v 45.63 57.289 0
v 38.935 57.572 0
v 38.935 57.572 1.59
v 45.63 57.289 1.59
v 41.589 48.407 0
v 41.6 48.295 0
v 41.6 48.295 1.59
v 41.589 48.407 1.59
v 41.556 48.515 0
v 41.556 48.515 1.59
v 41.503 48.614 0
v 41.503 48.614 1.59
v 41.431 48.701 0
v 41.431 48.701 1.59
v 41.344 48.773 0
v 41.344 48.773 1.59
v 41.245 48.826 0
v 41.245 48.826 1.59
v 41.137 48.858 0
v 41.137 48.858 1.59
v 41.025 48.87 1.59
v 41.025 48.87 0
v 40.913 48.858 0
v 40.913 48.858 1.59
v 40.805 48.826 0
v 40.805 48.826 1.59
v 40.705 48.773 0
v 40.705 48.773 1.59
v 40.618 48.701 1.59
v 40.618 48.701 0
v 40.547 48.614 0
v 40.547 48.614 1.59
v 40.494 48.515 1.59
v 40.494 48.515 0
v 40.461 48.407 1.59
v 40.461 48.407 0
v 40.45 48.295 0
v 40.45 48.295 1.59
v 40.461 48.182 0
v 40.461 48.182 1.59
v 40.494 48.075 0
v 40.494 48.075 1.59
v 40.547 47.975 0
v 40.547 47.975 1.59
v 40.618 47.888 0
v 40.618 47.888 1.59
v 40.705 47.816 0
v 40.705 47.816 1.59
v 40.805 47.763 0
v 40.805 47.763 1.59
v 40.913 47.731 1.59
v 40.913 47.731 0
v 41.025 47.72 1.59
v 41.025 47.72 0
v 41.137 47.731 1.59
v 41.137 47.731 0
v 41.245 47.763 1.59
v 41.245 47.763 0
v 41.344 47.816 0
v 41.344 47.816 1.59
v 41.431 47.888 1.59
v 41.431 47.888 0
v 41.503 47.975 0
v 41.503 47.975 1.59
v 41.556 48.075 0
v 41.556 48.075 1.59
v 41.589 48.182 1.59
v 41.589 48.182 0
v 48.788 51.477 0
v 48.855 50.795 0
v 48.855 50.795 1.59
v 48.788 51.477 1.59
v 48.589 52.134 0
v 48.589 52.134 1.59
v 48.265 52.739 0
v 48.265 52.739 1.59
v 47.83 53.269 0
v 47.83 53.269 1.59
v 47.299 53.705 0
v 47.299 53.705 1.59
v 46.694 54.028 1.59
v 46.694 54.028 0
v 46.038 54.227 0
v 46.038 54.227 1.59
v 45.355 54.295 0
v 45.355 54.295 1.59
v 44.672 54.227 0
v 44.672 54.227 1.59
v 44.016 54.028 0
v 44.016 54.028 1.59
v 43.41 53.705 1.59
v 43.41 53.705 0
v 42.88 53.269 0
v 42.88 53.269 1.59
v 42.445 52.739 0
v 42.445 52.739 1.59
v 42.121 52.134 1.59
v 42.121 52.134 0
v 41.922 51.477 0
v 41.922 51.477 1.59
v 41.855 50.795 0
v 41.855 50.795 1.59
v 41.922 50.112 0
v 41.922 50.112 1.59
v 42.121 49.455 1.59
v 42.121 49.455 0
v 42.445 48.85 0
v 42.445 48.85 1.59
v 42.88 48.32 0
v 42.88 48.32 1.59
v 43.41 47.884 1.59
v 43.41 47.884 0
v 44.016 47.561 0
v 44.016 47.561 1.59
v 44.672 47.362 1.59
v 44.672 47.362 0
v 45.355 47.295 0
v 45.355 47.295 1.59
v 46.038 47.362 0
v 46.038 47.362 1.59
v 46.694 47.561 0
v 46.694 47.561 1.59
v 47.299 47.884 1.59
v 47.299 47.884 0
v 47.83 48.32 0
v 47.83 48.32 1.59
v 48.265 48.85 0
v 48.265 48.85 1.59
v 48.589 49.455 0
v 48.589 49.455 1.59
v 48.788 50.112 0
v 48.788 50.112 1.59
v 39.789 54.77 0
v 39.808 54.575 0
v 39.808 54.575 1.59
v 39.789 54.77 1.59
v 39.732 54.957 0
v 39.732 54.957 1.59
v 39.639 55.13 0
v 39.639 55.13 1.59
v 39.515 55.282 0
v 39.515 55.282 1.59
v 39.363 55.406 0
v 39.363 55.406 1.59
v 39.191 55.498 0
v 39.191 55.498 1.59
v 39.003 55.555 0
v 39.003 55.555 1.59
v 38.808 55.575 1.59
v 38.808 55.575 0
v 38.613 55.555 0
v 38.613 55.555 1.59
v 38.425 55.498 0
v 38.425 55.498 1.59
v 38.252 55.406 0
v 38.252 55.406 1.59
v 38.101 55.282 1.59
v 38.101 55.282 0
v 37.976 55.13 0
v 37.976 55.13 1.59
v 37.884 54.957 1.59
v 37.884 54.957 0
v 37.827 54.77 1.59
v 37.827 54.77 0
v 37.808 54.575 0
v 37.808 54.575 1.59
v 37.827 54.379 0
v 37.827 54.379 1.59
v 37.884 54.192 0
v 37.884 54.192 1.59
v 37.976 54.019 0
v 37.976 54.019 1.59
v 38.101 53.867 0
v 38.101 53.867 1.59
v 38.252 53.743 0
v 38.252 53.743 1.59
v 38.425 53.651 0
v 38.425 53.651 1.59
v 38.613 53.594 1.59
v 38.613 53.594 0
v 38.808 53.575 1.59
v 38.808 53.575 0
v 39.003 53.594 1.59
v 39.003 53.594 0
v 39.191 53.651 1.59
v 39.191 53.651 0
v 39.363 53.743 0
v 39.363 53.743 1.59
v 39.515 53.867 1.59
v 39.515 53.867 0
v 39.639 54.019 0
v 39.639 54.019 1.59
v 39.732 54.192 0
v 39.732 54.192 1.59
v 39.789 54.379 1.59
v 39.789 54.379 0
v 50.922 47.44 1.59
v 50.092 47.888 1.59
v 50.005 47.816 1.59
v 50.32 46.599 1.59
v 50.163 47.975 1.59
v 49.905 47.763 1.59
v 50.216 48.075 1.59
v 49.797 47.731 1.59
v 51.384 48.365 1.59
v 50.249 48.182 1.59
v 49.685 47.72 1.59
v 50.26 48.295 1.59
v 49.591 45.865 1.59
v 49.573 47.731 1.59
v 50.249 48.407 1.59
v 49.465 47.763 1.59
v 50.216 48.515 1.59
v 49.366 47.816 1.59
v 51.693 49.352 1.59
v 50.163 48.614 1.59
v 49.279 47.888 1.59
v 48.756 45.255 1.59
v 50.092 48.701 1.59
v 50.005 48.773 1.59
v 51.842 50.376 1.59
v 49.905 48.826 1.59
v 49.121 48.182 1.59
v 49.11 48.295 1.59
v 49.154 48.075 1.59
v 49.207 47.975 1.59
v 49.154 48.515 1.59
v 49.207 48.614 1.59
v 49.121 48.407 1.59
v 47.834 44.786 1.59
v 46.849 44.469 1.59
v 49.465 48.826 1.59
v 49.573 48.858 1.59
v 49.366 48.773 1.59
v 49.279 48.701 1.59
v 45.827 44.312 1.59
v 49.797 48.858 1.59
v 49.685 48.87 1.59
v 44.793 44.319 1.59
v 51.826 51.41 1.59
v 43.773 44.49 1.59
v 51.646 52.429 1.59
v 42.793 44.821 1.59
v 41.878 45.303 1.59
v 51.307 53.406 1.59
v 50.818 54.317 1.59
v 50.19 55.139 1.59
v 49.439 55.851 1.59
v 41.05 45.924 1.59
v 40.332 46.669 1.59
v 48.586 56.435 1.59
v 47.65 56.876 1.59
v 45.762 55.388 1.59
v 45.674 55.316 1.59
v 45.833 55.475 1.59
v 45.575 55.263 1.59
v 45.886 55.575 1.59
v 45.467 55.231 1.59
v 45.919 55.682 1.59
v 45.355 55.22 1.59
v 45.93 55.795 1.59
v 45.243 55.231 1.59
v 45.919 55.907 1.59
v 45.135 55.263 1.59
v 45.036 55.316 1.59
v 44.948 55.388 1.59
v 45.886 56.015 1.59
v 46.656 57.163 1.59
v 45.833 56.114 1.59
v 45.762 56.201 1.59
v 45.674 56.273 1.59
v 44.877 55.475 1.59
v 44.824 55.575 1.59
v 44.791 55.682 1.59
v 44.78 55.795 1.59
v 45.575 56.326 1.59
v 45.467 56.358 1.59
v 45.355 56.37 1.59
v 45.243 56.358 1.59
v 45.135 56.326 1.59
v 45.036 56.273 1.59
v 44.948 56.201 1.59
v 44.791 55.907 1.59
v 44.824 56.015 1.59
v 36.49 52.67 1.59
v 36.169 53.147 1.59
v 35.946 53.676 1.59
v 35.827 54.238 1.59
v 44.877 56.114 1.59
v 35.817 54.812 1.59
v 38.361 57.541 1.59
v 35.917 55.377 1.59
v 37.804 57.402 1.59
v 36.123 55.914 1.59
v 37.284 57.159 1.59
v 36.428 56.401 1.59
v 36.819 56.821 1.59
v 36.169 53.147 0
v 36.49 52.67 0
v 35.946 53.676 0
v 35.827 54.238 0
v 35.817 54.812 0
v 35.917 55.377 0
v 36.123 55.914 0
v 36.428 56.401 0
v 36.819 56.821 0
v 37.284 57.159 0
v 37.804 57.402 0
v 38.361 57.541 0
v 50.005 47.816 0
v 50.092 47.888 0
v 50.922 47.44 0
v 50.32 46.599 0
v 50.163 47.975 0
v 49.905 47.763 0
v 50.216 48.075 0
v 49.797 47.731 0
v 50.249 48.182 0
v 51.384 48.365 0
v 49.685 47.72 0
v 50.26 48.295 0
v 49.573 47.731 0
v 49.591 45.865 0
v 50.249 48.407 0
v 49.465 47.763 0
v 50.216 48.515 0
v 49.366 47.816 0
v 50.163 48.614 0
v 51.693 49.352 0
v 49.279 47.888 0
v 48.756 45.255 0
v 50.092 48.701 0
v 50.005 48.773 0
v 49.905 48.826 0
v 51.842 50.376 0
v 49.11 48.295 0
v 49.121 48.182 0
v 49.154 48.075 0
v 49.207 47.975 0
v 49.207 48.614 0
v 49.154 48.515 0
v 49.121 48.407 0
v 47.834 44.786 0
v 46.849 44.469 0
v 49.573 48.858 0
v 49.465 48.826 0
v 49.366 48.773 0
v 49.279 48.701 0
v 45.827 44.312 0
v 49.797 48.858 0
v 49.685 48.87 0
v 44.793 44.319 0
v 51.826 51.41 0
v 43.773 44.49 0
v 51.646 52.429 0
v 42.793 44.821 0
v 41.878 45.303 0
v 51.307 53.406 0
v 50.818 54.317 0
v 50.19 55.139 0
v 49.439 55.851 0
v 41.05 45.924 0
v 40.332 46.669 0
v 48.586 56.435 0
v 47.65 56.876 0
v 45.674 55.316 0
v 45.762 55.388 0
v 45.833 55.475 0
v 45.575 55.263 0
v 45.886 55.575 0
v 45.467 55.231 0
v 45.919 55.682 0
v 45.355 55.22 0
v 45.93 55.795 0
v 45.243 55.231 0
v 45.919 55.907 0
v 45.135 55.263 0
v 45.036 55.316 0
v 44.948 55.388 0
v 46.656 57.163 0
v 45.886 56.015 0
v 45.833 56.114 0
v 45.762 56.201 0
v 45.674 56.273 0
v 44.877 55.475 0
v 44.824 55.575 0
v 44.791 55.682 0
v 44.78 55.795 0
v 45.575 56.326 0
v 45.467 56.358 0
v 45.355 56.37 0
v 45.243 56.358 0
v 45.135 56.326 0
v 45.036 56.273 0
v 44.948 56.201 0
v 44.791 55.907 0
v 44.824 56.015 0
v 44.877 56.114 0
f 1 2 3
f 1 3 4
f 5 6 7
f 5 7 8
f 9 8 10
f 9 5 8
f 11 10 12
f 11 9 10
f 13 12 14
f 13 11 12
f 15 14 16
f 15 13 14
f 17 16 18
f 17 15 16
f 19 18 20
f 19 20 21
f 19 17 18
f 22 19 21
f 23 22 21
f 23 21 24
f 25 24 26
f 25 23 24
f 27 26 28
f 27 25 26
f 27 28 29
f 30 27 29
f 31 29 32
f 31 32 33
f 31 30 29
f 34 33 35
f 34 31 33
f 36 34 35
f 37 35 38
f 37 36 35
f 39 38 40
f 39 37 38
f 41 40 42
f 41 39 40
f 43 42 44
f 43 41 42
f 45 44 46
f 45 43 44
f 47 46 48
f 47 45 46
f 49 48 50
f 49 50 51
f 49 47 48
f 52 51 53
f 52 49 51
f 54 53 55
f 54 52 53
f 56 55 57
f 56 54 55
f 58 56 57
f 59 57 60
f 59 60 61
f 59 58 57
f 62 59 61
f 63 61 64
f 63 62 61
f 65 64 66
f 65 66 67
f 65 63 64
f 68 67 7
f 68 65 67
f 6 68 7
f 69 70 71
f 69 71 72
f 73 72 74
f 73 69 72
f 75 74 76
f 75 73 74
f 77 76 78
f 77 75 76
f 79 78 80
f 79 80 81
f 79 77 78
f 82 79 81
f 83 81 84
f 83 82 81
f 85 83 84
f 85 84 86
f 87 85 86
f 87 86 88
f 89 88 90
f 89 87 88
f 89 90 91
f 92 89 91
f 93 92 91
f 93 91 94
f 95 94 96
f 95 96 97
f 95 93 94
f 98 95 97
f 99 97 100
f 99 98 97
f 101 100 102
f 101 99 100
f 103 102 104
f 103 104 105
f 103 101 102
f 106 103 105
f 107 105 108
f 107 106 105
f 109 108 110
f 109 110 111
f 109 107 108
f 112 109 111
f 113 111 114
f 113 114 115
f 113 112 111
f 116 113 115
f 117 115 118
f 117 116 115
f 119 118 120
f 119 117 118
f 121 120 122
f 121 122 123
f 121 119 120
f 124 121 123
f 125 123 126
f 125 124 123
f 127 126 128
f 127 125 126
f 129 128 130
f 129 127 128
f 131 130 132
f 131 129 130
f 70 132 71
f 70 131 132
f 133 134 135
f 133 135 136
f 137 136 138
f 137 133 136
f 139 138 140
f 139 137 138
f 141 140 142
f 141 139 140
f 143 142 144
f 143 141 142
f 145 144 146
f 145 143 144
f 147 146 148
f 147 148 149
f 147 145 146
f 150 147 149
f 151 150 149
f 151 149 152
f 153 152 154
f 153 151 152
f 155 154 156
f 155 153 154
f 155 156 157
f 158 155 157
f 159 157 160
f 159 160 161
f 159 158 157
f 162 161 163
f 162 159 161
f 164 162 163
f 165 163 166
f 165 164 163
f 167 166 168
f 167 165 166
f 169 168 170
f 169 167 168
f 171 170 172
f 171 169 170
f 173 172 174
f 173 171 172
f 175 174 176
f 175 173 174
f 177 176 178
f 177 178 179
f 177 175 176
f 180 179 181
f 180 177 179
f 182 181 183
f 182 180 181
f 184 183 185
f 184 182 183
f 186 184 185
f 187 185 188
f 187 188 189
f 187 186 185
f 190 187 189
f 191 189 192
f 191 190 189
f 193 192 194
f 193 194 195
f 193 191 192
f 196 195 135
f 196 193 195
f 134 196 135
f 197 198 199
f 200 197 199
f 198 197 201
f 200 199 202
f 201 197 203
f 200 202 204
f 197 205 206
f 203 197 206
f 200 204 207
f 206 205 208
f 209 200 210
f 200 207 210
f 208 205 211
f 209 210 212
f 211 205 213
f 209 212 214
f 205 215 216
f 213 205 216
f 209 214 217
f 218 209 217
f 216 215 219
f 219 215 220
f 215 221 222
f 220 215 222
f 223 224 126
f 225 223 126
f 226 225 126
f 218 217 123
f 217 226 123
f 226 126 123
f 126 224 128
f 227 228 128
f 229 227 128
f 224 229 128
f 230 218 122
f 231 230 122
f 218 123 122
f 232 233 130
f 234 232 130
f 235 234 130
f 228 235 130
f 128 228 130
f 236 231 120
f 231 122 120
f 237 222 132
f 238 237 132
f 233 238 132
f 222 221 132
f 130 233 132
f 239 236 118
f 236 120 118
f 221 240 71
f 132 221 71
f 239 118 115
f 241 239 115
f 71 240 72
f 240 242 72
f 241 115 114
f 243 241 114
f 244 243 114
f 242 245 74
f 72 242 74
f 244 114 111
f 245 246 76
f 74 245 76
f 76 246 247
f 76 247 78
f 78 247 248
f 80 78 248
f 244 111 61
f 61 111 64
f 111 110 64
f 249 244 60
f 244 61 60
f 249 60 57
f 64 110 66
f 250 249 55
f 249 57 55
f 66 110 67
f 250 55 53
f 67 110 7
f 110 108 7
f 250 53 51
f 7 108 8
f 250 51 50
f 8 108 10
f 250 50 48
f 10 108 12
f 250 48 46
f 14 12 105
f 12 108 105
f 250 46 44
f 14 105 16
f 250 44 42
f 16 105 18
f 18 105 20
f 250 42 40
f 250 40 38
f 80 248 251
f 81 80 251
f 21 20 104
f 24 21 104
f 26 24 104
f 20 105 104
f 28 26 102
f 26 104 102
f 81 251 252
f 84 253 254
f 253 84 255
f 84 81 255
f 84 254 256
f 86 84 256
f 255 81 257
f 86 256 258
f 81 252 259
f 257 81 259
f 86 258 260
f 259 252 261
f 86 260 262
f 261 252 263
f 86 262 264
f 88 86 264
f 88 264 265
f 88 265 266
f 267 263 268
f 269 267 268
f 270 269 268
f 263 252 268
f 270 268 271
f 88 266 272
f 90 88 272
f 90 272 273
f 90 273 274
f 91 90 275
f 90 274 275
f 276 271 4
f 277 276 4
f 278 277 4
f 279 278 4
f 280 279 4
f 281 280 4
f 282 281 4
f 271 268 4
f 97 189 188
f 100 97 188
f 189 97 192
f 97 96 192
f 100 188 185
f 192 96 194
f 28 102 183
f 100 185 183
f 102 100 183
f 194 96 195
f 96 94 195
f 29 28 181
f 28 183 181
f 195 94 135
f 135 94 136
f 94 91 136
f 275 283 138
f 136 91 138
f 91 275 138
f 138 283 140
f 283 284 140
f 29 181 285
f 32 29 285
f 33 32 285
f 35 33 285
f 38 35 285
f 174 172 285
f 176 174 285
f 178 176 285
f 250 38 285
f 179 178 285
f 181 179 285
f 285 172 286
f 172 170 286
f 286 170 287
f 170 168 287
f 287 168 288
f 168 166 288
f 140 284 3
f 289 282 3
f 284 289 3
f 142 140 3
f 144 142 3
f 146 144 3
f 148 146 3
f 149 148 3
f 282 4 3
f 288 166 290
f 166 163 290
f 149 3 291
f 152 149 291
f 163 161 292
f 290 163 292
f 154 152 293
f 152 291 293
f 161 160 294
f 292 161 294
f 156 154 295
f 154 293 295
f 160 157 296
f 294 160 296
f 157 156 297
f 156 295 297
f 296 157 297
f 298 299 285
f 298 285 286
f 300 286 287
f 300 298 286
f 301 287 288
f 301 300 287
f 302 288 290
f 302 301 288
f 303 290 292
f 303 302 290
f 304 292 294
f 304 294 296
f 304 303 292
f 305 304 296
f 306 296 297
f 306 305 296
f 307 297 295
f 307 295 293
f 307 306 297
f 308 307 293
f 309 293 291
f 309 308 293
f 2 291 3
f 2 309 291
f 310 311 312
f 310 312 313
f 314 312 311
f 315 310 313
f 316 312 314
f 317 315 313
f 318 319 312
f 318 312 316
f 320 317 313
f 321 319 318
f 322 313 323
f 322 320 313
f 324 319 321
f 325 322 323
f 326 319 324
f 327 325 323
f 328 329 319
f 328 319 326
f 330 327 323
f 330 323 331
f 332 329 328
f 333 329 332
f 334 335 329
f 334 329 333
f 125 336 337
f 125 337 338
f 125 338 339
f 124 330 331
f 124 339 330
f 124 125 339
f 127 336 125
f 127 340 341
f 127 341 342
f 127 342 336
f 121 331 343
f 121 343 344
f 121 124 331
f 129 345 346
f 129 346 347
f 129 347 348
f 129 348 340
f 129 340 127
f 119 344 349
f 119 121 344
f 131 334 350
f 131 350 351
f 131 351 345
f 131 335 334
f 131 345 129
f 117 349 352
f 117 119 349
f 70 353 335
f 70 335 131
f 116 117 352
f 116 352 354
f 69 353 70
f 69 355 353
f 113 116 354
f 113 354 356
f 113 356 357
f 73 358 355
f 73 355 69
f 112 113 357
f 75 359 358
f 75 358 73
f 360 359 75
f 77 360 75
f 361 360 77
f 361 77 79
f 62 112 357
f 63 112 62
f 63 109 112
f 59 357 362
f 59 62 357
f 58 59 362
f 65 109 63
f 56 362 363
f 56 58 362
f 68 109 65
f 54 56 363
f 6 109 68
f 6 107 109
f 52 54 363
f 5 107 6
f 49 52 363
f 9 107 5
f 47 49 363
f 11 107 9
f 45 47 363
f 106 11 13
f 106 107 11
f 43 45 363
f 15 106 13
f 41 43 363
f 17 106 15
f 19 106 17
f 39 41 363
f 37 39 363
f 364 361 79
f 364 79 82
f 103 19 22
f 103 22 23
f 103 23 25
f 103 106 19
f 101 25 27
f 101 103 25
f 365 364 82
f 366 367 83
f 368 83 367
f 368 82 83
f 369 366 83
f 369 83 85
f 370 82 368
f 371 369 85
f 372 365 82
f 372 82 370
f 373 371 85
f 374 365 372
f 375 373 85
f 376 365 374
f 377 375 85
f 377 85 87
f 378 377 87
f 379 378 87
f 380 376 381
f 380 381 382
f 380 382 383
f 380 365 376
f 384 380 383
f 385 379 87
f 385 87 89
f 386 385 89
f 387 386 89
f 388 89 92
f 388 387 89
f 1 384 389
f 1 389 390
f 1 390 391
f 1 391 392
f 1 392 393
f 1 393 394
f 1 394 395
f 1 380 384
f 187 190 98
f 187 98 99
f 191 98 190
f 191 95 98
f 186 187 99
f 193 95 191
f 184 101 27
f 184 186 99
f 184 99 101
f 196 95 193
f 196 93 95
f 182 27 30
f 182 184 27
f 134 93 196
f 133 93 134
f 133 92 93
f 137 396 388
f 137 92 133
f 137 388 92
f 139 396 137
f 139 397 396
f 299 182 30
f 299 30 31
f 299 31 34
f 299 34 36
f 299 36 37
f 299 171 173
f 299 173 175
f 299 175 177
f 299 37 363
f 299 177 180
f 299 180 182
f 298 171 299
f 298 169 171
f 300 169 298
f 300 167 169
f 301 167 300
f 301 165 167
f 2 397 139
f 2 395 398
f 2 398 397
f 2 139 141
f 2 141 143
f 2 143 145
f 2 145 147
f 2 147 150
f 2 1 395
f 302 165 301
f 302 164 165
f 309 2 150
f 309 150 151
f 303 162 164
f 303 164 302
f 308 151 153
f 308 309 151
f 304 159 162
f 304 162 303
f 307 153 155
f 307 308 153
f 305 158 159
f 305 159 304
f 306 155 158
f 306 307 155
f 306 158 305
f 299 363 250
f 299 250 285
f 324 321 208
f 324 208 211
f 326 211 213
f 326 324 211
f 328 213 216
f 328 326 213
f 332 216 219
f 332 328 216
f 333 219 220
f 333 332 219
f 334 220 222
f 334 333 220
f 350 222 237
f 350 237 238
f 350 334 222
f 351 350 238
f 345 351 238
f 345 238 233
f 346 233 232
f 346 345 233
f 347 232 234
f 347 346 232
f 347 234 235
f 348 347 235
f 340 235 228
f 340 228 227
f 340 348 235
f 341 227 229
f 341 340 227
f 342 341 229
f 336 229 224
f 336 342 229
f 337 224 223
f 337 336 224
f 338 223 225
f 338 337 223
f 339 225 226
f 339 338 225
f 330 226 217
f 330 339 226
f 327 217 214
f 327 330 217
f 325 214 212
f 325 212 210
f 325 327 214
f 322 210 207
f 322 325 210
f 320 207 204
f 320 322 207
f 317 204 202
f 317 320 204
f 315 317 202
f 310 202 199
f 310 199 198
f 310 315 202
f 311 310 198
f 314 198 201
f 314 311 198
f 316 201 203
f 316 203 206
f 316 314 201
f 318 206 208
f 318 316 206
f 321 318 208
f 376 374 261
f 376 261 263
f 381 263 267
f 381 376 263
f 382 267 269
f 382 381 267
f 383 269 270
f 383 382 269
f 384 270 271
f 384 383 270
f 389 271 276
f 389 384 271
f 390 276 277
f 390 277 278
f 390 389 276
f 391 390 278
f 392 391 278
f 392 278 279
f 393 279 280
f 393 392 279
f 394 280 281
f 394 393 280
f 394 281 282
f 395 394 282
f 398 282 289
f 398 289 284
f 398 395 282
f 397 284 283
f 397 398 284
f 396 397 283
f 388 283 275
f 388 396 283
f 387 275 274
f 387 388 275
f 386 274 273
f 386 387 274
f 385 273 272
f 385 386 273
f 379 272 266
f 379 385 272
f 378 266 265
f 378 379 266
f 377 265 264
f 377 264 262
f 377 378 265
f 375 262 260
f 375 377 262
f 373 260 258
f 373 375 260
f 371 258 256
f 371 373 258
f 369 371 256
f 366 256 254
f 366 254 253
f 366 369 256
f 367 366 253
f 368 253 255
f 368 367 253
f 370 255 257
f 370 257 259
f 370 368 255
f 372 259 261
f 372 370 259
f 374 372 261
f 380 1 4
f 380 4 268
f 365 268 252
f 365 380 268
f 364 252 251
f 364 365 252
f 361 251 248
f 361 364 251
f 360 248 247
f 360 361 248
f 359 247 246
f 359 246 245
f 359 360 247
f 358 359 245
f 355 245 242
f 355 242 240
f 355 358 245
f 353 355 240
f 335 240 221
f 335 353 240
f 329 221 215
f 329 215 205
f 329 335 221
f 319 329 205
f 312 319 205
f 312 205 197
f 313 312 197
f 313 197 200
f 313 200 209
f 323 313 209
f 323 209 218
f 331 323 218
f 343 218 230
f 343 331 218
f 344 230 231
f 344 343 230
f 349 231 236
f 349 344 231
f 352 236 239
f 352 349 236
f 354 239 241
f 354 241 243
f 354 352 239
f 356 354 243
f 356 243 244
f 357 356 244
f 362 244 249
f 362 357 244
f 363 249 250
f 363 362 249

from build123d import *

# Parameters (mm, degrees)
SKETCH1_R           = 3.5
SKETCH1_R_2         = 0.575
SKETCH1_R_3         = 1
BOSS_EXTRUDE1_DEPTH = 1.59


with BuildPart() as part:
    # Sketch1 → Boss-Extrude1 (new body)
    with BuildSketch(Plane.XY):
        with BuildLine():
            Line((38.934590504, 57.571868893), (45.629621497, 57.288743472))
            ThreePointArc((45.629621497, 57.288743472), (51.171586425, 47.893307318), (40.332417108, 46.668560697))
            Line((40.332417108, 46.668560697), (36.48972694, 52.670246074))
            ThreePointArc((36.48972694, 52.670246074), (36.123253783, 55.913581906), (38.934590504, 57.571868893))
        make_face()
        with Locations((45.35498918, 50.794547826)):
            Circle(SKETCH1_R, mode=Mode.SUBTRACT)
        with Locations((45.35498918, 55.794547826)):
            Circle(SKETCH1_R_2, mode=Mode.SUBTRACT)
        with Locations((49.685116199, 48.294547826)):
            Circle(SKETCH1_R_2, mode=Mode.SUBTRACT)
        with Locations((41.024862161, 48.294547826)):
            Circle(SKETCH1_R_2, mode=Mode.SUBTRACT)
        with Locations((38.807837127, 54.574547826)):
            Circle(SKETCH1_R_3, mode=Mode.SUBTRACT)
    extrude(amount=BOSS_EXTRUDE1_DEPTH)


solid = part.part
